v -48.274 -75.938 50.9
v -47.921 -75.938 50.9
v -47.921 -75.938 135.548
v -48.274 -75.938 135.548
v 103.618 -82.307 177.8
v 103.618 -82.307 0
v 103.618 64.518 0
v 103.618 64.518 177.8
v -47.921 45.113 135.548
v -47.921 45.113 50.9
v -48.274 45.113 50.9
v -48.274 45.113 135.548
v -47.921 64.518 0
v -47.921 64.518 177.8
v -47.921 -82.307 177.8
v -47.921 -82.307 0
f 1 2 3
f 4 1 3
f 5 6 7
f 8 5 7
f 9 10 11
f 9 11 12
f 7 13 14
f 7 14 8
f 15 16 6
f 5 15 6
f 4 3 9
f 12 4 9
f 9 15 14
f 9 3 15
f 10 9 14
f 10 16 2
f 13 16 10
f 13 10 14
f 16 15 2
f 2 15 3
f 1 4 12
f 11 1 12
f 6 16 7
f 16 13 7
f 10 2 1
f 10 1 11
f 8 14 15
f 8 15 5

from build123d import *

# Parameters (mm, degrees)
F0_W     = 151.539155
F0_H     = 146.825336
F1_DEPTH = 177.8
F3_DEPTH = 38.1
F4_W     = 100.581736
F4_H     = 129.213843
F5_DEPTH = 25.4
F6_W     = 121.051799
F6_H     = 84.648319
F7_DEPTH = 151.892


with BuildPart() as f1:
    # F0 (on Top) → F1 (new body)
    with BuildSketch(Plane.XY):
        with Locations((27.848792, -8.894455)):
            Rectangle(F0_W, F0_H)
    extrude(amount=F1_DEPTH)

    # F2 (on face) → F3 (join)
    with BuildSketch(Plane(origin=(-47.920786, 0, 0), x_dir=(0, -1, 0), z_dir=(-1, 0, 0))):
        Polygon((31.900443, 103.963971), (-31.454742, 103.963971), (-29.357936, 0), (31.900443, 0), align=None)
    extrude(amount=-F3_DEPTH)

    # F4 (on face) → F5 (join)
    with BuildSketch(Plane.YZ.offset(103.618369)):
        with Locations((-5.59498, 90.621782)):
            Rectangle(F4_W, F4_H)
    extrude(amount=-F5_DEPTH)

    # F6 (on face) → F7 (join)
    with BuildSketch(Plane.YZ.offset(103.618369)):
        with Locations((-15.412548, 93.22397)):
            Rectangle(F6_W, F6_H)
    extrude(amount=-F7_DEPTH)


solid = f1.part
